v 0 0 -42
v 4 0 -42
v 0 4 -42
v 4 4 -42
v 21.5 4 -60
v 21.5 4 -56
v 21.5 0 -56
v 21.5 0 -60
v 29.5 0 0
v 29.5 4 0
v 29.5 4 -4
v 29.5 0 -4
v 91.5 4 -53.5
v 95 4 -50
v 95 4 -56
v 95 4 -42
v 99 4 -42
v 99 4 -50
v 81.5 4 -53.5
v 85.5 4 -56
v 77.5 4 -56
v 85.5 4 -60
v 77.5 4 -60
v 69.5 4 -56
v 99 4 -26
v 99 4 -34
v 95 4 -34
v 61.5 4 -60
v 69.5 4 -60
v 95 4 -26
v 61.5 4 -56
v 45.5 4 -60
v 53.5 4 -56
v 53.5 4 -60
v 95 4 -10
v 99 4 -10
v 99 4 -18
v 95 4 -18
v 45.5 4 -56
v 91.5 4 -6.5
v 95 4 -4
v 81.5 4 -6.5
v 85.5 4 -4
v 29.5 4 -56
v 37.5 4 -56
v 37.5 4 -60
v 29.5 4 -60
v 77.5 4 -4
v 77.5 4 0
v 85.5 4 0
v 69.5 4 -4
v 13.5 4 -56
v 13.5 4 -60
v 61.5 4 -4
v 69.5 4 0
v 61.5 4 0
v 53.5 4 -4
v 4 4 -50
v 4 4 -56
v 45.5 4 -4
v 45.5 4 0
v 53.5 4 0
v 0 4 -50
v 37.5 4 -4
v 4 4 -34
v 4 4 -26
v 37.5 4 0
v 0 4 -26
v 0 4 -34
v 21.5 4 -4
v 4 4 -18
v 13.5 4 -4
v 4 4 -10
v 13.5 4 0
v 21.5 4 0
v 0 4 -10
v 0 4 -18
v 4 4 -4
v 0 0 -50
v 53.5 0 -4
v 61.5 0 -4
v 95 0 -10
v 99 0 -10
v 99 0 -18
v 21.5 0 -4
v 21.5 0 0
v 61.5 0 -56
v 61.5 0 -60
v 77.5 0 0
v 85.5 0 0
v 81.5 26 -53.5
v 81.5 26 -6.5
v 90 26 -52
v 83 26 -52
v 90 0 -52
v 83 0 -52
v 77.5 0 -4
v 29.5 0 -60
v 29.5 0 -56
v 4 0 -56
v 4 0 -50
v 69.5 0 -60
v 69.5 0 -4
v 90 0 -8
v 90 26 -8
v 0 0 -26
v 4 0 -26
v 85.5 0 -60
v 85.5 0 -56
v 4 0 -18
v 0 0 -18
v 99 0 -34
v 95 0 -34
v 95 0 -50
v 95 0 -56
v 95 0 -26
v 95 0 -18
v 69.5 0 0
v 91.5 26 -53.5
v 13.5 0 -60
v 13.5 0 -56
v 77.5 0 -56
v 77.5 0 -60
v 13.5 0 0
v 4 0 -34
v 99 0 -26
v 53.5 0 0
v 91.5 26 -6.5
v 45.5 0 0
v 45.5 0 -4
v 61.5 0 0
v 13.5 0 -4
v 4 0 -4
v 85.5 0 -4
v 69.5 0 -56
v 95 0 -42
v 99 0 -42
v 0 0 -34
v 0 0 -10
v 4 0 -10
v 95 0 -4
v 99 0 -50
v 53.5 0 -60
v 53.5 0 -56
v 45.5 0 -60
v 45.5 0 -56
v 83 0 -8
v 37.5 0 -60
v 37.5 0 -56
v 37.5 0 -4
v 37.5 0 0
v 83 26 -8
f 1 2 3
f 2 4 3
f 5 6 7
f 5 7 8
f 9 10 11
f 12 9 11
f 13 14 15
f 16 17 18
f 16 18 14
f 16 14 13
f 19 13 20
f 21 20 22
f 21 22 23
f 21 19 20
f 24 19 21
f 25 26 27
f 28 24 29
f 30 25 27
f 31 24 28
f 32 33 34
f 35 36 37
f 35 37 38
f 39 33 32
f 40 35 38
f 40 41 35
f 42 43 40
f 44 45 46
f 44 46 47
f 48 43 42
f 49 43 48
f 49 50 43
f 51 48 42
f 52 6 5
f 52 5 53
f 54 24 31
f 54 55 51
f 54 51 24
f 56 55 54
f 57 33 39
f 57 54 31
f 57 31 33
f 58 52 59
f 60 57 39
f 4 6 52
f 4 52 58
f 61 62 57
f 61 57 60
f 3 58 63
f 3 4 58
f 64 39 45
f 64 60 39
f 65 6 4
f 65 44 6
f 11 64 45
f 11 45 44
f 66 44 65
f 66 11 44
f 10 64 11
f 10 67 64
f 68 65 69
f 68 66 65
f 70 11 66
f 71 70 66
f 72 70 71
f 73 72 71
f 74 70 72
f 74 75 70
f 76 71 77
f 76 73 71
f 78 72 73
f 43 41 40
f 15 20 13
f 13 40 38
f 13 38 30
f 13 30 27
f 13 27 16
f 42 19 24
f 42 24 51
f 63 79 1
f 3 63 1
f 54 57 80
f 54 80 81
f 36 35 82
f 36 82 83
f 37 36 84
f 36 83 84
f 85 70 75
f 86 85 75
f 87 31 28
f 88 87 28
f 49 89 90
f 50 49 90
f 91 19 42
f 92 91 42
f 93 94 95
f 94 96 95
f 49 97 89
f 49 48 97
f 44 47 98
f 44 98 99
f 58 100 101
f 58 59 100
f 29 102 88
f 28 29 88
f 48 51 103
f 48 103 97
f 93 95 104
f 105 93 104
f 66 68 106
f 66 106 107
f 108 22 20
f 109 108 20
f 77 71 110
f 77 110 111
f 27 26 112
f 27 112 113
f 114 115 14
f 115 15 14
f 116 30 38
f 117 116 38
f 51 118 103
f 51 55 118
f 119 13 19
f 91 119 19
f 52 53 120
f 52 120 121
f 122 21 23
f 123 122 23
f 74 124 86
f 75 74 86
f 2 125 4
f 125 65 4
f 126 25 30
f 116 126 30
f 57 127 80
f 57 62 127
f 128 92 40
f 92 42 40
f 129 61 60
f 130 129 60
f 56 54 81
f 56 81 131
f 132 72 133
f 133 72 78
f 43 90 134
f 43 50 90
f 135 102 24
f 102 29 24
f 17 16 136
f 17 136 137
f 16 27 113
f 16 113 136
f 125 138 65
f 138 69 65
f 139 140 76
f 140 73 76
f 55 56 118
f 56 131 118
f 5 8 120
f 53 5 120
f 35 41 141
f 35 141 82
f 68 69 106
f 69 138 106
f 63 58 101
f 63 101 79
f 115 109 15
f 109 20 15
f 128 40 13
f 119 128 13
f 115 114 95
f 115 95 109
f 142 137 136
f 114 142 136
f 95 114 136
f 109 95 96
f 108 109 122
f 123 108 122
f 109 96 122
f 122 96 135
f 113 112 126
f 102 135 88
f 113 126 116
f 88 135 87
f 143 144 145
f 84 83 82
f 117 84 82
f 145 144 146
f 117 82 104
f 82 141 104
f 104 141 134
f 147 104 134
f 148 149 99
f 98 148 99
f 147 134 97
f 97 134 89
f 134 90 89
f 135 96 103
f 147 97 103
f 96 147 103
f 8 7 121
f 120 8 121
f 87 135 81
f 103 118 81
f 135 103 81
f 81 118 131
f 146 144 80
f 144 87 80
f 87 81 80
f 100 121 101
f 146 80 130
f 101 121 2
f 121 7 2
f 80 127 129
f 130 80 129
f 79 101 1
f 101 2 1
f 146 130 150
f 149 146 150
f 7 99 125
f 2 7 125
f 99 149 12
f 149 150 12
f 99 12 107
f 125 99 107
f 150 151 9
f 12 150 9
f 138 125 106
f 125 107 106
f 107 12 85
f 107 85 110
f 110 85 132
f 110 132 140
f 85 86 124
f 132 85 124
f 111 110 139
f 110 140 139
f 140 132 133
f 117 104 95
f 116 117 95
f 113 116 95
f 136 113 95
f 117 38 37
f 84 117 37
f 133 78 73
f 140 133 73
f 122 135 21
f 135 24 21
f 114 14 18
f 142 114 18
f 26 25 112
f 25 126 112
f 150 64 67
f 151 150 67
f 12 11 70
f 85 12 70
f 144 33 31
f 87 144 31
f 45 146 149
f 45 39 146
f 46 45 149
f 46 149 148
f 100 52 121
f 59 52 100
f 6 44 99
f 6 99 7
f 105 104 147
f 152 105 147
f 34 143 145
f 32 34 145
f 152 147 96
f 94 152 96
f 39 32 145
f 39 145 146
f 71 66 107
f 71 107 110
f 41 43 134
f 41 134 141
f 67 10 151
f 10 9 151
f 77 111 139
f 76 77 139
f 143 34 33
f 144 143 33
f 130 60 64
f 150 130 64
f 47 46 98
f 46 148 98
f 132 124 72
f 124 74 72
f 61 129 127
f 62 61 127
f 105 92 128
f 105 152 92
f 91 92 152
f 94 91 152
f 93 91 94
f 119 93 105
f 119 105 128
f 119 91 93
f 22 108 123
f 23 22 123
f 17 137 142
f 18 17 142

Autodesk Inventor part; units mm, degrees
ref_plane "YZ Plane" through (0, 0, 0) normal (1, 0, 0) x (0, 1, 0)
ref_plane "XZ Plane" through (0, 0, 0) normal (0, 1, 0) x (-1, 0, 0)
ref_plane "XY Plane" through (0, 0, 0) normal (0, 0, 1) x (1, 0, 0)
sketch "Sketch1" plane through (0, 0, 0) normal (0, 1, 0) x (-1, 0, 0)
  line L0 (0, 0) -> (-99, 0)
  line L1 (-99, 0) -> (-99, -60)
  line L2 (-99, -60) -> (0, -60)
  line L3 (0, -60) -> (0, 0)
  line L4 (-83, -52) -> (-90, -52)
  line L5 (-90, -52) -> (-90, -8)
  line L6 (-90, -8) -> (-83, -8)
  line L7 (-83, -8) -> (-83, -52)
  dimension "d0" = 99
  dimension "d1" = 60
  dimension "d2" = 7
  dimension "d3" = 44
  dimension "d4" = 8
  dimension "d5" = 9
extrude "Extrusion1" add sketch "Sketch1" along normal blind 4
sketch "Sketch2" plane through (0, 4, 0) normal (0, 1, 0) x (1, 0, 0)
  line L0 (83, 8) -> (83, 52) projected
  line L1 (83, 52) -> (90, 52) projected
  line L2 (90, 52) -> (90, 8) projected
  line L3 (90, 8) -> (83, 8) projected
  line L4 (91.5, 53.5) -> (81.5, 53.5)
  line L5 (81.5, 53.5) -> (81.5, 6.5)
  line L6 (81.5, 6.5) -> (91.5, 6.5)
  line L7 (91.5, 6.5) -> (91.5, 53.5)
  point P0 (0, 0)
  dimension "d8" = 1.5
extrude "Extrusion2" add sketch "Sketch2" along normal blind 22
sketch "Sketch3" plane through (0, 4, 0) normal (0, 1, 0) x (1, 0, 0)
  line L0 (99, 60) -> (0, 60) construction
  line L1 (0, 60) -> (0, 0) construction
  line L2 (0, 0) -> (99, 0) construction
  line L3 (99, 0) -> (99, 60) construction
  line L4 (4, 56) -> (95, 56) construction
  line L5 (95, 56) -> (95, 4) construction
  line L6 (95, 4) -> (4, 4) construction
  line L7 (4, 4) -> (4, 56) construction
  line L8 (0, 30) -> (99, 30) construction
  line L9 (49.5, 0) -> (49.5, 60) construction
  line L10 (0, 50) -> (0, 60)
  line L11 (0, 60) -> (13.5, 60)
  line L12 (13.5, 60) -> (13.5, 56)
  line L13 (13.5, 56) -> (4, 56)
  line L14 (4, 56) -> (4, 50)
  line L15 (4, 50) -> (0, 50)
  line L16 (0, 34) -> (4, 34)
  line L17 (4, 34) -> (4, 42)
  line L18 (4, 42) -> (0, 42)
  line L19 (0, 42) -> (0, 34)
  line L20 (45.5, 56) -> (37.5, 56)
  line L21 (37.5, 56) -> (37.5, 60)
  line L22 (37.5, 60) -> (45.5, 60)
  line L23 (45.5, 60) -> (45.5, 56)
  line L24 (29.5, 56) -> (21.5, 56)
  line L25 (21.5, 56) -> (21.5, 60)
  line L26 (21.5, 60) -> (29.5, 60)
  line L27 (29.5, 60) -> (29.5, 56)
  line L28 (0, 10) -> (0, 0)
  line L29 (0, 0) -> (13.5, 0)
  line L30 (13.5, 0) -> (13.5, 4)
  line L31 (13.5, 4) -> (4, 4)
  line L32 (4, 4) -> (4, 10)
  line L33 (4, 10) -> (0, 10)
  line L34 (0, 26) -> (4, 26)
  line L35 (4, 26) -> (4, 18)
  line L36 (4, 18) -> (0, 18)
  line L37 (0, 18) -> (0, 26)
  line L38 (45.5, 4) -> (37.5, 4)
  line L39 (37.5, 4) -> (37.5, 0)
  line L40 (37.5, 0) -> (45.5, 0)
  line L41 (45.5, 0) -> (45.5, 4)
  line L42 (29.5, 4) -> (21.5, 4)
  line L43 (21.5, 4) -> (21.5, 0)
  line L44 (21.5, 0) -> (29.5, 0)
  line L45 (29.5, 0) -> (29.5, 4)
  line L46 (99, 60) -> (99, 0) construction
  line L47 (95, 4) -> (95, 56) construction
  line L48 (99, 50) -> (99, 60)
  line L49 (99, 60) -> (85.5, 60)
  line L50 (85.5, 60) -> (85.5, 56)
  line L51 (85.5, 56) -> (95, 56)
  line L52 (95, 56) -> (95, 50)
  line L53 (95, 50) -> (99, 50)
  line L54 (99, 34) -> (95, 34)
  line L55 (95, 34) -> (95, 42)
  line L56 (95, 42) -> (99, 42)
  line L57 (99, 42) -> (99, 34)
  line L58 (53.5, 56) -> (61.5, 56)
  line L59 (61.5, 56) -> (61.5, 60)
  line L60 (61.5, 60) -> (53.5, 60)
  line L61 (53.5, 60) -> (53.5, 56)
  line L62 (69.5, 56) -> (77.5, 56)
  line L63 (77.5, 56) -> (77.5, 60)
  line L64 (77.5, 60) -> (69.5, 60)
  line L65 (69.5, 60) -> (69.5, 56)
  line L66 (77.5, 4) -> (77.5, 0)
  line L67 (69.5, 4) -> (77.5, 4)
  line L68 (77.5, 0) -> (69.5, 0)
  line L69 (69.5, 0) -> (69.5, 4)
  line L70 (61.5, 4) -> (61.5, 0)
  line L71 (53.5, 0) -> (53.5, 4)
  line L72 (53.5, 4) -> (61.5, 4)
  line L73 (61.5, 0) -> (53.5, 0)
  line L74 (85.5, 0) -> (85.5, 4)
  line L75 (85.5, 4) -> (95, 4)
  line L76 (95, 4) -> (95, 10)
  line L77 (99, 0) -> (85.5, 0)
  line L78 (99, 10) -> (99, 0)
  line L79 (95, 10) -> (99, 10)
  line L80 (95, 18) -> (99, 18)
  line L81 (95, 26) -> (95, 18)
  line L82 (99, 18) -> (99, 26)
  line L83 (99, 26) -> (95, 26)
  dimension "d11" = 4
  dimension "d12" = 8
  dimension "d13" = 4
  dimension "d14" = 8
  dimension "d15" = 8
  dimension "d16" = 4
  dimension "d17" = 8
  dimension "d18" = 8
  dimension "d19" = 8
extrude "Extrusion3" cut sketch "Sketch3" against normal up to surface (4 mm away)
properties part number "top" material "PBT Plastic Black"
